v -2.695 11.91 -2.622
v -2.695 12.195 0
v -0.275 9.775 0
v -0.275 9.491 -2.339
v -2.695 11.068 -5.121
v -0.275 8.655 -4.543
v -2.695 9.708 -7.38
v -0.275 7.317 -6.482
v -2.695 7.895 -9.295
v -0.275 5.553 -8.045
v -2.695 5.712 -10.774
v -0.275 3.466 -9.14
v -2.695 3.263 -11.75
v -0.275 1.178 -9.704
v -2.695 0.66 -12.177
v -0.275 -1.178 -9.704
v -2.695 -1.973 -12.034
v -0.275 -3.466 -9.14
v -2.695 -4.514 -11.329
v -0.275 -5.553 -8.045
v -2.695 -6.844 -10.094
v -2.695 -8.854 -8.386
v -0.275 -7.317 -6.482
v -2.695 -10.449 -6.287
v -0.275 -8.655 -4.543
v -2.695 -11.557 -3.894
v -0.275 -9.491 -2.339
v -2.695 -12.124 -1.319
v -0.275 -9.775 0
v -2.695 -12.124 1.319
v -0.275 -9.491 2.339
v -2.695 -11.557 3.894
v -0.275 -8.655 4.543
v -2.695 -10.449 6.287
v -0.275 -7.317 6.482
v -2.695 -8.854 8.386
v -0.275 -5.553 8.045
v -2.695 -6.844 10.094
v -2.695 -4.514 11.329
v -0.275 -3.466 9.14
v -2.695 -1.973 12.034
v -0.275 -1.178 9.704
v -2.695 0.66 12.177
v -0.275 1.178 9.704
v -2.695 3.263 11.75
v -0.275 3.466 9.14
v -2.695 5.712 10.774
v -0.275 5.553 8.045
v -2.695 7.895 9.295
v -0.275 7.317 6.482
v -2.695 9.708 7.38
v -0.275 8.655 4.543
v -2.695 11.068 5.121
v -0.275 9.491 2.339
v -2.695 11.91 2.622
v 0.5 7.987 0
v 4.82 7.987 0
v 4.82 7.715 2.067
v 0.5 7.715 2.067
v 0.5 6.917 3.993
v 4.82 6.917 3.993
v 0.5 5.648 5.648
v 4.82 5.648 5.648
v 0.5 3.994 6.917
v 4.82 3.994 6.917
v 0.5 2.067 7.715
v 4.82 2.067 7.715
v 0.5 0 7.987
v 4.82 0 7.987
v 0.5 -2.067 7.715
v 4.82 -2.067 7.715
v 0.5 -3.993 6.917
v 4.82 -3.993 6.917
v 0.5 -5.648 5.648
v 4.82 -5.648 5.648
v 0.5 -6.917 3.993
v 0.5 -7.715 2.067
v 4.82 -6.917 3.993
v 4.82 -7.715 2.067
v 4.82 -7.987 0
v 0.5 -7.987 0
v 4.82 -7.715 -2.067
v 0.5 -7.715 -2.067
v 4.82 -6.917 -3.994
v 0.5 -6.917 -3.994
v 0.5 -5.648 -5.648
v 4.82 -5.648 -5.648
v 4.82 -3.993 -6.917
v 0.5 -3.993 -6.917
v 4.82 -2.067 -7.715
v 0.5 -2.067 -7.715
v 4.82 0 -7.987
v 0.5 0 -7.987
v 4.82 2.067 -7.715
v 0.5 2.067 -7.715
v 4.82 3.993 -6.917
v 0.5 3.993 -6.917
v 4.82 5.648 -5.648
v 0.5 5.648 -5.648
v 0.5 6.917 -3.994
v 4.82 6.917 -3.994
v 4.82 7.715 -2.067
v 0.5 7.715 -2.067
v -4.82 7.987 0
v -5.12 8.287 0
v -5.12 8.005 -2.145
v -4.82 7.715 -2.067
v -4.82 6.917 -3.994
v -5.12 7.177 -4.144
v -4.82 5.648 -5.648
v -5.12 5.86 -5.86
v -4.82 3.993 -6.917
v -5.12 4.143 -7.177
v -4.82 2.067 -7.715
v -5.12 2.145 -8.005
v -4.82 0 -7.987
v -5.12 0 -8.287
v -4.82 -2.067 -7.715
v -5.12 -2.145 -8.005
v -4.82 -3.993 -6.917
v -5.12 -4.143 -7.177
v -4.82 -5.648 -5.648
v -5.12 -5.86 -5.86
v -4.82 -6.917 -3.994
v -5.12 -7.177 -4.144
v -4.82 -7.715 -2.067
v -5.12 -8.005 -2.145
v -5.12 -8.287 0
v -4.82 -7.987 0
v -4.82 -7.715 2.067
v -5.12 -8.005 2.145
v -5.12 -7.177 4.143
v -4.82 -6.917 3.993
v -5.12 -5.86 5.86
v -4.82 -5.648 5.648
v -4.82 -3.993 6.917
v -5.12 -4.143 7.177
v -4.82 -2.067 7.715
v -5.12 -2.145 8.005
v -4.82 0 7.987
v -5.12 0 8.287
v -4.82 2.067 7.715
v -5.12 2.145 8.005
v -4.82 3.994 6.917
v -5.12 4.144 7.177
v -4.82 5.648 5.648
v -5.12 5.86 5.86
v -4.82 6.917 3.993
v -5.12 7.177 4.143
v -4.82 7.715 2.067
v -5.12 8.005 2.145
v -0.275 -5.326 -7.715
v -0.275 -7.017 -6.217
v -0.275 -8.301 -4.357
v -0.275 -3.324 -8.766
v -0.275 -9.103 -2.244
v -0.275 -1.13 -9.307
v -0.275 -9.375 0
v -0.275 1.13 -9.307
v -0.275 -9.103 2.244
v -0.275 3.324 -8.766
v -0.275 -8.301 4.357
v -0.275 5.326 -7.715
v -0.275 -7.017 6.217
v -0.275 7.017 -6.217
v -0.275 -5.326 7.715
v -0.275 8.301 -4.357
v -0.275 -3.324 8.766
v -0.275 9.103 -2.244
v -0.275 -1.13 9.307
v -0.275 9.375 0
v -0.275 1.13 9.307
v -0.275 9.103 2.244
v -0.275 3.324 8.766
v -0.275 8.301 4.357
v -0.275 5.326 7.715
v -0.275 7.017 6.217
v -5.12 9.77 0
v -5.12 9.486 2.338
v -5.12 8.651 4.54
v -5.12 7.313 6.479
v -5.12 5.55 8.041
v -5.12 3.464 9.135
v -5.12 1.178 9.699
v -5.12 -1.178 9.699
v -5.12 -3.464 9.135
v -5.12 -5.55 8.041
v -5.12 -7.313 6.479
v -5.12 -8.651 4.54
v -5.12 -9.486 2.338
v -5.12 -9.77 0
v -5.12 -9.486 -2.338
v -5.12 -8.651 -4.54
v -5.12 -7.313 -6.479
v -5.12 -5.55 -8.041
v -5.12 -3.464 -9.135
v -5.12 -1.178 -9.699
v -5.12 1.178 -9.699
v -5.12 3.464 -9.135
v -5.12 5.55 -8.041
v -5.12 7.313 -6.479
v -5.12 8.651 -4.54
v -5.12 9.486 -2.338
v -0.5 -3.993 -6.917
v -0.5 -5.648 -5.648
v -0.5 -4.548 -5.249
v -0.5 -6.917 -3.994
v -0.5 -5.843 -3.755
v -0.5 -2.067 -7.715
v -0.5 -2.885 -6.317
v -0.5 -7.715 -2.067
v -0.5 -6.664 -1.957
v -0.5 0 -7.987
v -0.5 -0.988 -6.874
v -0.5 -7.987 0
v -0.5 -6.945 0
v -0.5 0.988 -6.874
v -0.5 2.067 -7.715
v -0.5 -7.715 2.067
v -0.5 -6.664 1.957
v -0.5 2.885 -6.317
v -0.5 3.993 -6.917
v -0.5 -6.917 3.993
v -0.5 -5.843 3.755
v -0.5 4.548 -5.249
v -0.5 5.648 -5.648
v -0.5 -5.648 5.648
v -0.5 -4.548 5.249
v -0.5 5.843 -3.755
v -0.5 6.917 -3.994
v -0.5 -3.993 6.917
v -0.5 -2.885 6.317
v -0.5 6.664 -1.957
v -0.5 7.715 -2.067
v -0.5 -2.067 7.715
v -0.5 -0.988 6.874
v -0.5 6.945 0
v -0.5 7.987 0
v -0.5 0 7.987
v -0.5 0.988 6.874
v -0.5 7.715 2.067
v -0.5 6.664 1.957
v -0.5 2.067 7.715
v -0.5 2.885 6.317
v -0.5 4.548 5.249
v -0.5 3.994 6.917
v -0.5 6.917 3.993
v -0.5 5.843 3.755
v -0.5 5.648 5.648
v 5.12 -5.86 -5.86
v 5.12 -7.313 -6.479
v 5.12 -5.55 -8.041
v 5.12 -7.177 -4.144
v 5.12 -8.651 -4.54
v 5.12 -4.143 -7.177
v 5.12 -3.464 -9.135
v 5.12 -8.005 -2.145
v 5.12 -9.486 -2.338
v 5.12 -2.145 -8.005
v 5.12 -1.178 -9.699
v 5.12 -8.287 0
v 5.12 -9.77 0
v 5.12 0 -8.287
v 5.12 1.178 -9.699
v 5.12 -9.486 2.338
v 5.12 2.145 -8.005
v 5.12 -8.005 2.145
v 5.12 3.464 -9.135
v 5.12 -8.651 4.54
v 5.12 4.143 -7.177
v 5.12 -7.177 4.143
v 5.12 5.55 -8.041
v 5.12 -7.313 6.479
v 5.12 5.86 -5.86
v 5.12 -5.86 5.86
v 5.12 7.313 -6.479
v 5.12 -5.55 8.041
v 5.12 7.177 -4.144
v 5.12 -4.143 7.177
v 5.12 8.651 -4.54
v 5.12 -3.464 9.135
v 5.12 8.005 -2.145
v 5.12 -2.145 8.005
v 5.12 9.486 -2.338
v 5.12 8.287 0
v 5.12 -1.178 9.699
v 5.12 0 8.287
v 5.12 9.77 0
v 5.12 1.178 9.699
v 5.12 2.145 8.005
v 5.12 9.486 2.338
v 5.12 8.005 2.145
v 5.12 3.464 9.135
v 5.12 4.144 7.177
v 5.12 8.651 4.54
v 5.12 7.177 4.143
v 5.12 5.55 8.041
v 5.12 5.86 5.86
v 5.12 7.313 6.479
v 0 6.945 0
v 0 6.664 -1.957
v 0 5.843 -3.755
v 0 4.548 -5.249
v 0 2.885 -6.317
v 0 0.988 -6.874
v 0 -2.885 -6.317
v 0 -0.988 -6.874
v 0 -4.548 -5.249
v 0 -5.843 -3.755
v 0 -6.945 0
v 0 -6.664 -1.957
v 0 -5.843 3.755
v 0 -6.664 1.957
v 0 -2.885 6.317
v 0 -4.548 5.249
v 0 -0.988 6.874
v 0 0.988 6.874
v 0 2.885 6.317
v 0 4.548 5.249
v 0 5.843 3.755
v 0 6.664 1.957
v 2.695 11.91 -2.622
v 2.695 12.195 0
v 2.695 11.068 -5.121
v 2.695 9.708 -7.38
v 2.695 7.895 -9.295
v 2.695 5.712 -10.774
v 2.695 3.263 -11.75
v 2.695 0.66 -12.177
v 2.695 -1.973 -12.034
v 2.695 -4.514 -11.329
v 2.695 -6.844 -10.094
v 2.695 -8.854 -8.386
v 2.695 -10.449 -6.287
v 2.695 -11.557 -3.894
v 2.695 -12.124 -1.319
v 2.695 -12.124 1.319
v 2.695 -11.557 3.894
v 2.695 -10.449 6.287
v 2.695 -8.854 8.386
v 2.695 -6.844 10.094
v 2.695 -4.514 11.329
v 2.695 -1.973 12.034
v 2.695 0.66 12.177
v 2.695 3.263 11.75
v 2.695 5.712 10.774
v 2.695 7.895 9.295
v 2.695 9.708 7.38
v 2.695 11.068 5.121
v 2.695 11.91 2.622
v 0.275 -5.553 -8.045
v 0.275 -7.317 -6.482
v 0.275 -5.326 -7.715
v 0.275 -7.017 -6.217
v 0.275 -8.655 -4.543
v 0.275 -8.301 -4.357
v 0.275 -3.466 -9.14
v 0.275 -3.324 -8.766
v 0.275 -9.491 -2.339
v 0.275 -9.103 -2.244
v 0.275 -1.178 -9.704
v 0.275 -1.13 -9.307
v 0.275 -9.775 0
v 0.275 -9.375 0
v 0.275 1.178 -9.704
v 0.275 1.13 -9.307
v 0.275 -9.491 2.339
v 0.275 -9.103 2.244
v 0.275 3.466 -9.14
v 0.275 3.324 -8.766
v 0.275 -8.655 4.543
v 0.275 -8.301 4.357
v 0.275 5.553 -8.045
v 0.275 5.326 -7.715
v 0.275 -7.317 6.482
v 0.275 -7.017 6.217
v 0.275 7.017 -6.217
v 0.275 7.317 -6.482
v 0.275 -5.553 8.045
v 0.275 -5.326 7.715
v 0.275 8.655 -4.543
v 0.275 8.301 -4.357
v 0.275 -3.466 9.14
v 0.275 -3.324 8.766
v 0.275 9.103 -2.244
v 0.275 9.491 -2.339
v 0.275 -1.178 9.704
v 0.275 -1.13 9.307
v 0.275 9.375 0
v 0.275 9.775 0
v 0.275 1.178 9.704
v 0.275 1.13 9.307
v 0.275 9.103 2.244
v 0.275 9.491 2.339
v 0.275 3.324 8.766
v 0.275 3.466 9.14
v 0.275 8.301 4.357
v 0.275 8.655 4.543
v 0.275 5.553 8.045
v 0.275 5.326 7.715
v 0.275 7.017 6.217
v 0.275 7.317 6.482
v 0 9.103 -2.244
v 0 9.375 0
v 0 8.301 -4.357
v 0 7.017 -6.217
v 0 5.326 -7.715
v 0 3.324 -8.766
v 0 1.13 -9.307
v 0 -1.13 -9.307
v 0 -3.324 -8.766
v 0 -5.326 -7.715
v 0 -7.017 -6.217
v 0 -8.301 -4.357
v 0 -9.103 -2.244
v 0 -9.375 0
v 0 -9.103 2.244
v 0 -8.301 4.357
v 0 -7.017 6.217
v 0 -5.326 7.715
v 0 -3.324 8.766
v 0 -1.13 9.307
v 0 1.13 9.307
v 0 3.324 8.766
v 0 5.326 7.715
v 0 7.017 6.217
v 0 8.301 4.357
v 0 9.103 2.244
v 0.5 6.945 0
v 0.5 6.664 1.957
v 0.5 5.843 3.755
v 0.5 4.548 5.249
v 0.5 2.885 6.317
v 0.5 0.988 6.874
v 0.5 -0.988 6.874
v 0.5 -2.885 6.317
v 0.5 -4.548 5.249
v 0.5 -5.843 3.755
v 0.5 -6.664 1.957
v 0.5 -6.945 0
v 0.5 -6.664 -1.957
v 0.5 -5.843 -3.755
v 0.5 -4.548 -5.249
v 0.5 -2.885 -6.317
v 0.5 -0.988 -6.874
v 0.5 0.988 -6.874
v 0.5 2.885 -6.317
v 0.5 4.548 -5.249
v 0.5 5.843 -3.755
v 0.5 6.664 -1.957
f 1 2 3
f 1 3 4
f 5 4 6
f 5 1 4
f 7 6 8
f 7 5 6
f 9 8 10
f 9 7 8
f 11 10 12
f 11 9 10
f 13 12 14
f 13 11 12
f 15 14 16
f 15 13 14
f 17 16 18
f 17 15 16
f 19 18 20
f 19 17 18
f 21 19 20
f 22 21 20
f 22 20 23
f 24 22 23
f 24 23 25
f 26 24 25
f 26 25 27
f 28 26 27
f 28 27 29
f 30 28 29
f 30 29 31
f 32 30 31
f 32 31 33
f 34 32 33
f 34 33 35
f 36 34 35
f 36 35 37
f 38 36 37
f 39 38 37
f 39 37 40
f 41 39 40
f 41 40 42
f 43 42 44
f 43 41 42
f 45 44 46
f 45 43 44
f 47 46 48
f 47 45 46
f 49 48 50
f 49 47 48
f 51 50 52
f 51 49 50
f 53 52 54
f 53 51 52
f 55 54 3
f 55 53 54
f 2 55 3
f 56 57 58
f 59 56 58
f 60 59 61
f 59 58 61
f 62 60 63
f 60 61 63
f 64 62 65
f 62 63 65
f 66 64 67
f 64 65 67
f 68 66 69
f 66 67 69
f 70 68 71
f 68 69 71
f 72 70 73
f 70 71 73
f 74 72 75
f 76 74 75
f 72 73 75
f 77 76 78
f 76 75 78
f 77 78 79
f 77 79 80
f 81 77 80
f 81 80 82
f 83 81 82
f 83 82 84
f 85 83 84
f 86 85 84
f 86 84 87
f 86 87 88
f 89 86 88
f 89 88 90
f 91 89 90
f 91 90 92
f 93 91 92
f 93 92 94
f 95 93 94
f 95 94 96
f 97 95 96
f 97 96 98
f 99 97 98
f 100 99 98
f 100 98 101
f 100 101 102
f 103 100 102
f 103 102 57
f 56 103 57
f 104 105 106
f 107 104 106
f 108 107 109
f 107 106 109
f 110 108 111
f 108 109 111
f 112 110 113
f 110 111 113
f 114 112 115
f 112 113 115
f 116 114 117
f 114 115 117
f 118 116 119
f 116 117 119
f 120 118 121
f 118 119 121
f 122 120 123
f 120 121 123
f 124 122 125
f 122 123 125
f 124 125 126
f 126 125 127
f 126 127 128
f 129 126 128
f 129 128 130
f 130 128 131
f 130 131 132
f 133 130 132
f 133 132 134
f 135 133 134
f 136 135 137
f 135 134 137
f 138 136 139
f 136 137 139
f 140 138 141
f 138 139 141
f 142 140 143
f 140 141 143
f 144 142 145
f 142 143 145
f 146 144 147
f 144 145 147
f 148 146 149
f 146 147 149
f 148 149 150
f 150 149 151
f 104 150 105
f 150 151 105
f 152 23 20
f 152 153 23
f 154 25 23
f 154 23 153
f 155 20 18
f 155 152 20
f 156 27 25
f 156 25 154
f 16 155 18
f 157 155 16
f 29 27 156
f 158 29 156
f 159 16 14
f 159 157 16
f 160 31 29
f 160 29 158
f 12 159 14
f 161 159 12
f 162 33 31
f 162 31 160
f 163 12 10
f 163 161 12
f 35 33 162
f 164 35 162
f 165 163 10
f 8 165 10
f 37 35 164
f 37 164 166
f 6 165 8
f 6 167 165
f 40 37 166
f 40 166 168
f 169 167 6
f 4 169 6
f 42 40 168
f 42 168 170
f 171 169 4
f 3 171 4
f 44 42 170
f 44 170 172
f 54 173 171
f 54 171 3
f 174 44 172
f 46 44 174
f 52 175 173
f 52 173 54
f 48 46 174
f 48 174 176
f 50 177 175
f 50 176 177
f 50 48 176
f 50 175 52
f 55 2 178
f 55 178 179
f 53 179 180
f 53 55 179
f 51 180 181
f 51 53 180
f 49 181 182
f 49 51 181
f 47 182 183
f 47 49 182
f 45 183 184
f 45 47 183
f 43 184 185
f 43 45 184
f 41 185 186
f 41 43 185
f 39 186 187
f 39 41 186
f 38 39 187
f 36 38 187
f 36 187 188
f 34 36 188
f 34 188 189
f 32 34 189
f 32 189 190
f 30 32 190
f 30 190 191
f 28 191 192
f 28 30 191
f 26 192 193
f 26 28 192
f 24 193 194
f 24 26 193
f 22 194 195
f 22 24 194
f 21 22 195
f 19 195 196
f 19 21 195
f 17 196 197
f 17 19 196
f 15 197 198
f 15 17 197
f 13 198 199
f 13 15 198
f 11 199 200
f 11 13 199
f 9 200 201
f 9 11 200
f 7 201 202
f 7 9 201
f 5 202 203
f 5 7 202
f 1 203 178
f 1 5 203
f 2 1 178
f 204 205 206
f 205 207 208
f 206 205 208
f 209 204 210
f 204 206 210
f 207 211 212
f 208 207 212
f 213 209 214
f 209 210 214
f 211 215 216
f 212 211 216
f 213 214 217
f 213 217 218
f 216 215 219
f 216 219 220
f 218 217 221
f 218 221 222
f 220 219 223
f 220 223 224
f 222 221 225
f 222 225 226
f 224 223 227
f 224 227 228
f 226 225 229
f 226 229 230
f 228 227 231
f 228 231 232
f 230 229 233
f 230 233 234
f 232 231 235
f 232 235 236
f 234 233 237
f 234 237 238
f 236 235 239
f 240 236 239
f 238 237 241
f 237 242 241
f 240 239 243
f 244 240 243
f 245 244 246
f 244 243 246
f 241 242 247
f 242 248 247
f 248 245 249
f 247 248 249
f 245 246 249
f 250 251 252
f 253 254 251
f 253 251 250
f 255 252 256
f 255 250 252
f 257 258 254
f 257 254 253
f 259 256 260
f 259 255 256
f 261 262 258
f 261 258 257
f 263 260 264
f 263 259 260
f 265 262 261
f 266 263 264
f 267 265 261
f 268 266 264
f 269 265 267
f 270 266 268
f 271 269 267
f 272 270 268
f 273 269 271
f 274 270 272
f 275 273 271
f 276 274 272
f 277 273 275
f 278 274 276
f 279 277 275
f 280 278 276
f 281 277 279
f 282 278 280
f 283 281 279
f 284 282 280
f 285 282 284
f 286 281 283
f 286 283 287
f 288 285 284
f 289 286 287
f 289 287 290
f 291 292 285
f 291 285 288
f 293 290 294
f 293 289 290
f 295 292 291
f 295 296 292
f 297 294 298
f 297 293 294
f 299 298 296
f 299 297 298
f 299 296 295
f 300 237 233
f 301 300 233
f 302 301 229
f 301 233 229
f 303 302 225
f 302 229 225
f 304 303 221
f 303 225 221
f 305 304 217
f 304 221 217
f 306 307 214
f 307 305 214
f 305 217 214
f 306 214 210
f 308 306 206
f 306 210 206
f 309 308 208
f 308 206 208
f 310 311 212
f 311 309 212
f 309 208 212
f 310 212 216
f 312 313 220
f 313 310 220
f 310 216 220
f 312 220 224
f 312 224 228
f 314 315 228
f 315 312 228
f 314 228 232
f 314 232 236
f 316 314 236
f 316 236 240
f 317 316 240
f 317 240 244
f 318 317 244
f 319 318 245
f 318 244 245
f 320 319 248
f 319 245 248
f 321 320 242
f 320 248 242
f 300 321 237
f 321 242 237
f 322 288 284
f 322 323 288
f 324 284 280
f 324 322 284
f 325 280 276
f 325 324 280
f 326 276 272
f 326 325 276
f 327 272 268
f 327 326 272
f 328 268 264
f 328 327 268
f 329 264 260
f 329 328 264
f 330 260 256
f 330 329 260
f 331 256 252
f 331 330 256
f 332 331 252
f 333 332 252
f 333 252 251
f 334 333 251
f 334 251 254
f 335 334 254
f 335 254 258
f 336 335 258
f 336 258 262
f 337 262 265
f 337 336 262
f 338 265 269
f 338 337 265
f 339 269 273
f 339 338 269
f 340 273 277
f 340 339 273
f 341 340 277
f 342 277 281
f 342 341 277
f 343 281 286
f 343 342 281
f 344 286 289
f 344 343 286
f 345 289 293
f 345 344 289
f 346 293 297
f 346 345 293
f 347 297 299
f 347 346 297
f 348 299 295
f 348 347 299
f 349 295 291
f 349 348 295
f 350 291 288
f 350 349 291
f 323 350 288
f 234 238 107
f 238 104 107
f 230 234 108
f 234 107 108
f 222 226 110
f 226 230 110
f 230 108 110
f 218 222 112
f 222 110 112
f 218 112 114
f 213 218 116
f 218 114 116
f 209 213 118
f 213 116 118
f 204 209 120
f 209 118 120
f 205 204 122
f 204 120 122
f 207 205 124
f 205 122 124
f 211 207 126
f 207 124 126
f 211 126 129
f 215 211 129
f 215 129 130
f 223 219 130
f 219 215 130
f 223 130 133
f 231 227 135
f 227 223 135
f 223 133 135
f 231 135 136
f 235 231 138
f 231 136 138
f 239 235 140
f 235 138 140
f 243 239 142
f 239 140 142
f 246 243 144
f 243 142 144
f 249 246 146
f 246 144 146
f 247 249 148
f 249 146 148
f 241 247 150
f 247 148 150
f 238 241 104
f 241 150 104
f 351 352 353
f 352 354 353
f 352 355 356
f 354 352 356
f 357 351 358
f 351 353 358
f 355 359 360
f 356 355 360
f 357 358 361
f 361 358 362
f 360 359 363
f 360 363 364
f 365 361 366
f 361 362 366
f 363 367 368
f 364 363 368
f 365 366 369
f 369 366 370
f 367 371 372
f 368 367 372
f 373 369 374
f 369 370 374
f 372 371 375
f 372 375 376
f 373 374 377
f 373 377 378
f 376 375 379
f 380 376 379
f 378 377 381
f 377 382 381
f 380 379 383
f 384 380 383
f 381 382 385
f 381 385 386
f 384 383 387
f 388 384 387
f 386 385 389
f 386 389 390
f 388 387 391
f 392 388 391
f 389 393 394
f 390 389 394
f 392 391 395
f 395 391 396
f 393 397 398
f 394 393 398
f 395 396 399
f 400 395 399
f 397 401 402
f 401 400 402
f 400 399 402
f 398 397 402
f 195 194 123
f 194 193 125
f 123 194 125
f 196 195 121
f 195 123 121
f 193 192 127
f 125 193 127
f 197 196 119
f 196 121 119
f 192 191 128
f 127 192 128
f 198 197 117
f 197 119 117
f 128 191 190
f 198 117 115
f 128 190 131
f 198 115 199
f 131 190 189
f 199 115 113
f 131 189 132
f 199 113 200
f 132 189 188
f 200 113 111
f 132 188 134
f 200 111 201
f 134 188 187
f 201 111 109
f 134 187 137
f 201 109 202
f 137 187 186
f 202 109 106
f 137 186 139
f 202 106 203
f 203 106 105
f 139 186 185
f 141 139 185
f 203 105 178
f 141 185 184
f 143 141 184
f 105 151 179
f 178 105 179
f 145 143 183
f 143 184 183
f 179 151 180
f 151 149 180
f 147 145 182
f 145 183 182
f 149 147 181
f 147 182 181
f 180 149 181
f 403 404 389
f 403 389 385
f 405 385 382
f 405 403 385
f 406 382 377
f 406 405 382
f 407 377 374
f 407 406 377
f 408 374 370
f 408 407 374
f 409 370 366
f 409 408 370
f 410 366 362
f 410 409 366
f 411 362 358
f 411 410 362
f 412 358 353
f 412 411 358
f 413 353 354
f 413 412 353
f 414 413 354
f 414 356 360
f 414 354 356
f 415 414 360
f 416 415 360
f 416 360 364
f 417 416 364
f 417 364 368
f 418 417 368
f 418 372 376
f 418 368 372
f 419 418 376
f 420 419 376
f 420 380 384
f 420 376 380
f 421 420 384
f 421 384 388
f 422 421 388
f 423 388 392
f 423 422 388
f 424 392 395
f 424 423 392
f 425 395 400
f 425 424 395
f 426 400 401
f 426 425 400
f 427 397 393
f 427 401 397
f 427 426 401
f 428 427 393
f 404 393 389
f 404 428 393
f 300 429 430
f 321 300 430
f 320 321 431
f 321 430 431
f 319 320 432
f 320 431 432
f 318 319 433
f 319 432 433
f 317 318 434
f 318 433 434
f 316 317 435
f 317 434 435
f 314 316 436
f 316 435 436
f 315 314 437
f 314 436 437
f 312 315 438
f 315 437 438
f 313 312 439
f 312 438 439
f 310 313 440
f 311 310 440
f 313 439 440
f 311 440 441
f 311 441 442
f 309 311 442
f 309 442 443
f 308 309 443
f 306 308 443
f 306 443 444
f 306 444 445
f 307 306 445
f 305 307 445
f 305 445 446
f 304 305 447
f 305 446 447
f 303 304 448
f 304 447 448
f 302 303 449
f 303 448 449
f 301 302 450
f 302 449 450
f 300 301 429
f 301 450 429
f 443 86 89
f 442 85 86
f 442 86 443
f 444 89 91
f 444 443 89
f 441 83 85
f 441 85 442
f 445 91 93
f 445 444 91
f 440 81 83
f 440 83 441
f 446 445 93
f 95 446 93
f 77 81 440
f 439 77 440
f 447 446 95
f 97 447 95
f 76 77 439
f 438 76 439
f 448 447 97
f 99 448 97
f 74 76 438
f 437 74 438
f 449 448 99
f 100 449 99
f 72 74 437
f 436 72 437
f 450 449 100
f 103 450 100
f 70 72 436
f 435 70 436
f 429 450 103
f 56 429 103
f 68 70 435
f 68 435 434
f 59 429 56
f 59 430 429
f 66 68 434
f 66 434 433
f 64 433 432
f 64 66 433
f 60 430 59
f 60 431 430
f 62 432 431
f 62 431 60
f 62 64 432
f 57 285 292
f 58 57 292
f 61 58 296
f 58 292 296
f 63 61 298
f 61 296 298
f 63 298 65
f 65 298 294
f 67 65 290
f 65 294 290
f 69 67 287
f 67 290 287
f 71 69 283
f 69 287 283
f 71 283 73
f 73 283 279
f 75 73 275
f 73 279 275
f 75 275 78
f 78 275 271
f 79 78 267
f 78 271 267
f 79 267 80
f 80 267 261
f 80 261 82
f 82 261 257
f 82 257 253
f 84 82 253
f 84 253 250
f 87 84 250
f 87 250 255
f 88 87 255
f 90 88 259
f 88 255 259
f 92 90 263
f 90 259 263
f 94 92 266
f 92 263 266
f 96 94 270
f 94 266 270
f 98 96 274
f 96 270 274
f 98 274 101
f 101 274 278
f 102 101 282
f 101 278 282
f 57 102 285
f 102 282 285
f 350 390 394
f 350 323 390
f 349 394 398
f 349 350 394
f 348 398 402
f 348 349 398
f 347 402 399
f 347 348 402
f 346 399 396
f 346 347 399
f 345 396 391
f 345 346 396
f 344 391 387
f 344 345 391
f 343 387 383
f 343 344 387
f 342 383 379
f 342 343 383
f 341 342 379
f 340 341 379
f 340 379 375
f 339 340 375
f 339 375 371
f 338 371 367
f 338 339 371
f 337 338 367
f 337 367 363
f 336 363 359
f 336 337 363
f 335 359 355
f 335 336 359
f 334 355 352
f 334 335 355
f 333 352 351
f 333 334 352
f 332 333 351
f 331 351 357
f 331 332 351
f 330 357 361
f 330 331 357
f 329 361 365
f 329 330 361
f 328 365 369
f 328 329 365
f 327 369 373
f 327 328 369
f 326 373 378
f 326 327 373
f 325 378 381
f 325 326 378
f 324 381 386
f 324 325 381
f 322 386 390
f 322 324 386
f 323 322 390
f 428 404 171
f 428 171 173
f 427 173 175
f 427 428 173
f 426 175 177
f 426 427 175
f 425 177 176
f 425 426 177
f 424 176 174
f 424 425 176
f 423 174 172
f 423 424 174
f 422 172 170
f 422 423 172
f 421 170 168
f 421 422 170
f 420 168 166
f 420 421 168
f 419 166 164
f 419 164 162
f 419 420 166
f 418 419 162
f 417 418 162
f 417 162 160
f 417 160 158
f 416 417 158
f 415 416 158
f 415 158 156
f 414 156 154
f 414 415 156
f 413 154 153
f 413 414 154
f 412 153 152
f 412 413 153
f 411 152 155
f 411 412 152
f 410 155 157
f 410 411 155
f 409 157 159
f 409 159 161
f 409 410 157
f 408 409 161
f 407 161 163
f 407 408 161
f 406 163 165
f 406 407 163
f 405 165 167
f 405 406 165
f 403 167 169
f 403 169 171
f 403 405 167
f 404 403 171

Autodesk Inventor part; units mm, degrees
ref_plane "YZ Plane" through (0, 0, 0) normal (1, 0, 0) x (0, 1, 0)
ref_plane "XZ Plane" through (0, 0, 0) normal (0, 1, 0) x (-1, 0, 0)
ref_plane "XY Plane" through (0, 0, 0) normal (0, 0, 1) x (1, 0, 0)
sketch "Sketch1" plane through (0, 0, 0) normal (0, 0, 1) x (1, 0, 0)
  line L0 (0, 0) -> (10, 0)
  line L1 (0, 0) -> (0, 6.945) construction
  line L2 (0, 6.945) -> (0.5, 6.945)
  line L3 (0.5, 6.945) -> (0.5, 7.987)
  line L4 (0.5, 7.987) -> (4.82, 7.987)
  line L5 (5.12, 8.287) -> (5.12, 9.77)
  line L6 (5.12, 9.77) -> (2.695, 12.195)
  line L7 (2.695, 12.195) -> (0.275, 9.775)
  line L8 (0.275, 9.775) -> (0.275, 9.375)
  line L9 (0.275, 9.375) -> (0, 9.375)
  line L10 (4.82, 7.987) -> (5.12, 8.287)
  line L11 (0, 6.945) -> (0, 11.2763) construction
  line L12 (0, 6.945) -> (-0.5, 6.945)
  line L13 (-0.5, 6.945) -> (-0.5, 7.987)
  line L14 (-0.5, 7.987) -> (-4.82, 7.987)
  line L15 (-5.12, 8.287) -> (-5.12, 9.77)
  line L16 (-5.12, 9.77) -> (-2.695, 12.195)
  line L17 (-2.695, 12.195) -> (-0.275, 9.775)
  line L18 (-0.275, 9.775) -> (-0.275, 9.375)
  line L19 (-0.275, 9.375) -> (0, 9.375)
  line L20 (-4.82, 7.987) -> (-5.12, 8.287)
  point P0 (5.12, 7.987)
  point P1 (-5.12, 7.987)
  dimension "d0" = 10
  dimension "d2" = 0.5
  dimension "d3" = 15.974
  dimension "d4" = 13.89
  dimension "d5" = 0.3
  dimension "d6" = 0.3
  dimension "d7" = 19.54
  dimension "d8" = 5.12
  dimension "d12" = 24.39
  dimension "d14" = 18.75
  dimension "d16" = 0.275
  dimension "d17" = 135
  dimension "d18" = 135
  dimension "d19" = 2.695
revolve "Revolution1" add sketch "Sketch1" angle 360 about axis through (0, 0, 0) along (1, 0, 0)
equation "\"d6\" = d5"
properties part number "Dual V Wheel" material "Acetal Resin, Black"
